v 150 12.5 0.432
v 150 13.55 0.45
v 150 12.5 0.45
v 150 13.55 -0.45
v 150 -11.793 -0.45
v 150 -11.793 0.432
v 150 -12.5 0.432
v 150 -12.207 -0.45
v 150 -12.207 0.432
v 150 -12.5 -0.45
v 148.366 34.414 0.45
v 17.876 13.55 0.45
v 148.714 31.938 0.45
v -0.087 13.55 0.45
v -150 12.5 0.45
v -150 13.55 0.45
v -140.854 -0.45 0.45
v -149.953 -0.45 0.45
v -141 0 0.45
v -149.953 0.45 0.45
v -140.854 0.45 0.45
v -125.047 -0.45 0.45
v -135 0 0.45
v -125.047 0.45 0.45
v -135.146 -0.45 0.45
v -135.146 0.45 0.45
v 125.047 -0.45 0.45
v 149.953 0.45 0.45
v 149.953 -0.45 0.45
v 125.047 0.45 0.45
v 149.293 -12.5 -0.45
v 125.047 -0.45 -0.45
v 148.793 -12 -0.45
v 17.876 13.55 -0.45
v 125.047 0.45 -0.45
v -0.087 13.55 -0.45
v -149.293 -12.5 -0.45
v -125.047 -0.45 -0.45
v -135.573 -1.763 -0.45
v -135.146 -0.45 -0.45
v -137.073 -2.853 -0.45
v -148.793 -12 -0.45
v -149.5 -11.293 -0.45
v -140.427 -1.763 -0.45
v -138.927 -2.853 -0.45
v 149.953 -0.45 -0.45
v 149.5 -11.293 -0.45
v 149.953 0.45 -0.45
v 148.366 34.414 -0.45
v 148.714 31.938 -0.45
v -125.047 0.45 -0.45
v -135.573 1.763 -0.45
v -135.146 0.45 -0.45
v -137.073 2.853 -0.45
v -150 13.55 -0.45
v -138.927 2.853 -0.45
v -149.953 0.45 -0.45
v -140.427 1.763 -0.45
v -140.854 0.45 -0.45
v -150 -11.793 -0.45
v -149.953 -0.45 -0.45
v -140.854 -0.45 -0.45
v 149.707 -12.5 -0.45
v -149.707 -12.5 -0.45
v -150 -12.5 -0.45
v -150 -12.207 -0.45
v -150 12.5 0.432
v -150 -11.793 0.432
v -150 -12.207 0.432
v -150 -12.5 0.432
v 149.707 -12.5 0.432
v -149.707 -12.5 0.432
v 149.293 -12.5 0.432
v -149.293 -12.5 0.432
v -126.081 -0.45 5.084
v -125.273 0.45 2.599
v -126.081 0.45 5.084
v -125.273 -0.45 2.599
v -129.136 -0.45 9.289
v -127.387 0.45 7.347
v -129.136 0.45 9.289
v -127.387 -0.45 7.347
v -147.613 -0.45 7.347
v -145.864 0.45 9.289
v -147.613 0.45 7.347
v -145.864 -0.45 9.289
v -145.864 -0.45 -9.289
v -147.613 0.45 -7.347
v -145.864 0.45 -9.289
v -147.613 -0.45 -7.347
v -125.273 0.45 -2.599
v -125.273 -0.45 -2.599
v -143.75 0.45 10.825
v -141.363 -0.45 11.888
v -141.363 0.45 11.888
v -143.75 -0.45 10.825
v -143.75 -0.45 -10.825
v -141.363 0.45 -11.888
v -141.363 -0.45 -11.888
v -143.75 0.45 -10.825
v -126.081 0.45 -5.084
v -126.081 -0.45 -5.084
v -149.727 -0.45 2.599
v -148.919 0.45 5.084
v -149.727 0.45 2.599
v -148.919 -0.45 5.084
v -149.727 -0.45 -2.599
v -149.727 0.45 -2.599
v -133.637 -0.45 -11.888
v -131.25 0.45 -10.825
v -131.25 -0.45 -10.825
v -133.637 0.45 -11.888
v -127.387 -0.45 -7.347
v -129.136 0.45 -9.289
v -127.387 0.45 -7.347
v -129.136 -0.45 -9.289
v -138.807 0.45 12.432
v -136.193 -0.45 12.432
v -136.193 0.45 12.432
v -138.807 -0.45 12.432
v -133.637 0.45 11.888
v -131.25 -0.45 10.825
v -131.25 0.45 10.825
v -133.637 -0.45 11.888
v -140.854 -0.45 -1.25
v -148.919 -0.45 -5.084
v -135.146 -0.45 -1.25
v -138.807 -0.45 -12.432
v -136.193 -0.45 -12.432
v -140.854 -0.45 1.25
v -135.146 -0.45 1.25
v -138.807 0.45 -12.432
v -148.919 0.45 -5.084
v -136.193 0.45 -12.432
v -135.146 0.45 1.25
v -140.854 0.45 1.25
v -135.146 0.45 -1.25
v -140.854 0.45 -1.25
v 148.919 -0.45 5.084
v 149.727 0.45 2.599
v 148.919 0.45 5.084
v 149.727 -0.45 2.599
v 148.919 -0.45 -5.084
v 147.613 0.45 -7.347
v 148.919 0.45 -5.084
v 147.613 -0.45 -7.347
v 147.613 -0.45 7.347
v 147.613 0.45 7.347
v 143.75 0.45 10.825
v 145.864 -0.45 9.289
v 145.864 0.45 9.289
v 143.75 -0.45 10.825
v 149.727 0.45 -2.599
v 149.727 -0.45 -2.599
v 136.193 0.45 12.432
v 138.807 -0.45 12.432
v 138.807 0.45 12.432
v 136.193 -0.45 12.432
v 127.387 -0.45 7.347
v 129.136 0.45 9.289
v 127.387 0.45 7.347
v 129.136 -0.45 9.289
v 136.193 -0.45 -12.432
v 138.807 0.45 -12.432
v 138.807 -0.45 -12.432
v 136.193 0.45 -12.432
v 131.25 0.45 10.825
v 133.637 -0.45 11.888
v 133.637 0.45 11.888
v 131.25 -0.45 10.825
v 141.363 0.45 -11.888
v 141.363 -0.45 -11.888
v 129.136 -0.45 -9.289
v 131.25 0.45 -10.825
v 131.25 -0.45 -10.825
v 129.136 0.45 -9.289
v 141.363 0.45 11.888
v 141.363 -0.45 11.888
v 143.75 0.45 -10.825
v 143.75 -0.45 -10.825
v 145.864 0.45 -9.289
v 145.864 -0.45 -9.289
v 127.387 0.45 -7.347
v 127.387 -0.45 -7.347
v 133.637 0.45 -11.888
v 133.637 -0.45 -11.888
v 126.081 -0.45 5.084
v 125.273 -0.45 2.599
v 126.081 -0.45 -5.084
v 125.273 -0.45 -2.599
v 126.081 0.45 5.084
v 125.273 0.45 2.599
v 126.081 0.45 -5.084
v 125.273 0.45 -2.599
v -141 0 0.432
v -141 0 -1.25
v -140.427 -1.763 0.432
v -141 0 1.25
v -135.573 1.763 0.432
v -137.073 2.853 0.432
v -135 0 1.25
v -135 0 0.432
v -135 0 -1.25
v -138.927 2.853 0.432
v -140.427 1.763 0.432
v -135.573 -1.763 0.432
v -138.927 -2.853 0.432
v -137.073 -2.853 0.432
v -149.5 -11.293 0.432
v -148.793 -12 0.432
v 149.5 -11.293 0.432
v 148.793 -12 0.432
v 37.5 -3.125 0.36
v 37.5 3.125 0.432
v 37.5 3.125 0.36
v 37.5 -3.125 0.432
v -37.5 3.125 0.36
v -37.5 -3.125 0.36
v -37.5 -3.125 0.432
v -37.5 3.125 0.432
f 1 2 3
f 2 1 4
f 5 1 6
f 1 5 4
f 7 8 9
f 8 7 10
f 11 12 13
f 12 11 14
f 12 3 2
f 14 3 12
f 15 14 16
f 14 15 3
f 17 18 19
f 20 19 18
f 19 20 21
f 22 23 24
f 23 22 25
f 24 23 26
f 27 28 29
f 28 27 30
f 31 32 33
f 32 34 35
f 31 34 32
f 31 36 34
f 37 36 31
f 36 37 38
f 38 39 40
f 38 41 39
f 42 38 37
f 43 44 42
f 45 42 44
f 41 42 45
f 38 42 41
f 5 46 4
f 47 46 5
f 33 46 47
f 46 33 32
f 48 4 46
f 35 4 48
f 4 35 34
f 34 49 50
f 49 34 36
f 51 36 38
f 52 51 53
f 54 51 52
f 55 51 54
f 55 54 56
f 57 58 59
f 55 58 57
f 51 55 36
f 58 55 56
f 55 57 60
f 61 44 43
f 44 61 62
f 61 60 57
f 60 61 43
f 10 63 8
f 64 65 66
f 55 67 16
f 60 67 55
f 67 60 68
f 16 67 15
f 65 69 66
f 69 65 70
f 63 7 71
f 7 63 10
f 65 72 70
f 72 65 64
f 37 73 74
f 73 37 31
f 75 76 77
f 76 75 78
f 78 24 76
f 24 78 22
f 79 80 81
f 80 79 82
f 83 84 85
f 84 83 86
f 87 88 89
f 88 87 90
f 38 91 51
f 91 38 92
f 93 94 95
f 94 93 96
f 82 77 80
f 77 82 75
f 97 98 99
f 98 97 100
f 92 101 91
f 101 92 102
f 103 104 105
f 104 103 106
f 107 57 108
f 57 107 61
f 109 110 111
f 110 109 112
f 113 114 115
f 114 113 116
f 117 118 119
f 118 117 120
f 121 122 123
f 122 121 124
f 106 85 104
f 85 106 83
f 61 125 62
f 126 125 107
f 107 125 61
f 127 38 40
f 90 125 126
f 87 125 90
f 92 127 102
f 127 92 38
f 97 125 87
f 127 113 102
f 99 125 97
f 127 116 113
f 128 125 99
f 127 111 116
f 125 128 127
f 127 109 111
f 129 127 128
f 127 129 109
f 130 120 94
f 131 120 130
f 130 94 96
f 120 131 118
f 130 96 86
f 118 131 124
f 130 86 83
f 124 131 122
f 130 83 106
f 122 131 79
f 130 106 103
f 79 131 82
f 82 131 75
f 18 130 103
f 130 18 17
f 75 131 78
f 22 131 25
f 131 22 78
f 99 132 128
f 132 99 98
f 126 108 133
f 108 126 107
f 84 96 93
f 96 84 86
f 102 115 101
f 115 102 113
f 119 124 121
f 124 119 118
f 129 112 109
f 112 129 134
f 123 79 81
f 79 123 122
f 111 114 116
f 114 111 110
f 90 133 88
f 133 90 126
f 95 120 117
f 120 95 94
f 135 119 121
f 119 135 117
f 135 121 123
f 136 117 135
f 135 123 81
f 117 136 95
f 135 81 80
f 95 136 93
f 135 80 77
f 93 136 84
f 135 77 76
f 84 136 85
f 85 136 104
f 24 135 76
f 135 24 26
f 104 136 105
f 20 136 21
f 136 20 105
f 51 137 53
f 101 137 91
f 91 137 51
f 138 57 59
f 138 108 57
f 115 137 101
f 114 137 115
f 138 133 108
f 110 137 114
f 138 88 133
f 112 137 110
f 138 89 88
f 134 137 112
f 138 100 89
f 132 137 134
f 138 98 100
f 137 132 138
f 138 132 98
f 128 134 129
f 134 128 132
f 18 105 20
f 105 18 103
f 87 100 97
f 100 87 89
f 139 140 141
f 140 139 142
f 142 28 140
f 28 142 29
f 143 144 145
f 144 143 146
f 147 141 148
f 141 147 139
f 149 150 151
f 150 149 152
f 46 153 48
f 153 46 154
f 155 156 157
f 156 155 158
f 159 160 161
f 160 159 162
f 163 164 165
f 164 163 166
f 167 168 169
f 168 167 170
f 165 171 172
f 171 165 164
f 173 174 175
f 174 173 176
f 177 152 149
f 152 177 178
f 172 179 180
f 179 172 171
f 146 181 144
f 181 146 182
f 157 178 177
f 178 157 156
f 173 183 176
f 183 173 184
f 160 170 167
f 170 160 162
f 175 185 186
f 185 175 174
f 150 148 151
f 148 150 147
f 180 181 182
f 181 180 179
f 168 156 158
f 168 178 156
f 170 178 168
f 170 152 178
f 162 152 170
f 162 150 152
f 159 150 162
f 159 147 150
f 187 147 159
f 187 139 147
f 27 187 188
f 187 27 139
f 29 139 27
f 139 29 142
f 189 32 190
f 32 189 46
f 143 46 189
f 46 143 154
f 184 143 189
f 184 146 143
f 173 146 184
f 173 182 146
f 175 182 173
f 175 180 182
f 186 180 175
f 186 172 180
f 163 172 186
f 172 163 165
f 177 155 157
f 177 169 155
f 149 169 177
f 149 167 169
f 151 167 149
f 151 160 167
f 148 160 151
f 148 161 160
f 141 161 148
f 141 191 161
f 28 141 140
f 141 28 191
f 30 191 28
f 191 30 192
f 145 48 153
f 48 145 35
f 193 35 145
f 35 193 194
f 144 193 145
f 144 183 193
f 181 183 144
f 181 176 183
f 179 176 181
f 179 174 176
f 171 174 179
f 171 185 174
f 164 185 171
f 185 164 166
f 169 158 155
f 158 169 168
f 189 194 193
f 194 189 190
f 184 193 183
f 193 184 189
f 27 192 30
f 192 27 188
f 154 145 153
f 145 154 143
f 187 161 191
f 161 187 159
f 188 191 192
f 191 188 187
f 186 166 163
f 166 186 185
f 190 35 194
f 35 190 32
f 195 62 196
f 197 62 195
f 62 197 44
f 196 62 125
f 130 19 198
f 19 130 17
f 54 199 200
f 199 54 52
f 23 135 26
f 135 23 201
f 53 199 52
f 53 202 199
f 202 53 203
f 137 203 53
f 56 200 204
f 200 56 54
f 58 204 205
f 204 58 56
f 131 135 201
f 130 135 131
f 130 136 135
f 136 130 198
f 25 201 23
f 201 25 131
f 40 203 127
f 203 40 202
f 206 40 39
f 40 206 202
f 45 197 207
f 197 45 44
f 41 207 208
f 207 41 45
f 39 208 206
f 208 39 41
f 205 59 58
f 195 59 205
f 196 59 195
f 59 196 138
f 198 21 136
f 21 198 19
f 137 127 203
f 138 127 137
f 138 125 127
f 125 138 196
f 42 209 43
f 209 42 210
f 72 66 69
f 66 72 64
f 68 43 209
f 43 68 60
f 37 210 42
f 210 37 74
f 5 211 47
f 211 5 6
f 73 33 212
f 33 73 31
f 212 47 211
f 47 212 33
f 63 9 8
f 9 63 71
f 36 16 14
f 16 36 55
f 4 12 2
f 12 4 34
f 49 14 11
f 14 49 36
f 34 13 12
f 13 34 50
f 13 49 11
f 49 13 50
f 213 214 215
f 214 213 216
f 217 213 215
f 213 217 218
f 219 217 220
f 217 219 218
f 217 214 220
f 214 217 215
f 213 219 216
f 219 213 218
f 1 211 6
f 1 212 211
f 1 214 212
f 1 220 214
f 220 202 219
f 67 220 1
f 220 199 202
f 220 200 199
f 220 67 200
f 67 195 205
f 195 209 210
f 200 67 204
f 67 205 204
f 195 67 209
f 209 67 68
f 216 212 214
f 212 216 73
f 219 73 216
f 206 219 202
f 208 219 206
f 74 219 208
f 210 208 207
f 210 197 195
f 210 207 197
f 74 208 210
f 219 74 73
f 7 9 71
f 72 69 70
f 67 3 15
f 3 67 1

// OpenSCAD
// Parameters
blade_L = 300; //[150:600:1]
blade_W = 25; //[12.5:50:0.5]
blade_T = 0.9; //[0.45:1.8:0.05]
tooth_pitch = 2.5; //[1.25:5:0.05]
tooth_H = 1.2; //[0.6:2.4:0.05]
tooth_tip_angle = 60; //[30:90:1]
tooth_root_R = 0.2; //[0.1:0.6:0.05]
mount_hole_d = 6; //[3:12:0.1]
mount_hole_edge_offset = 12; //[6:24:0.5]
end_round_R = 3; //[1.5:8:0.5]
bimetal_band_W = 3; //[1.5:8:0.5]
overlap = 0.8; //[0.2:2:0.1]
tooth_skew_deg = 8; //[0:20:1]
tooth_count = 80; //[20:200:1]
chamfer_C = 1; //[0.5:3:0.1]

// Base Shapes
module blade_body_sheet() {
  translate([0, 0, 0])
    cube([blade_L, blade_W, blade_T], center=true);
}

module end_profile_left_cap() {
  translate([-blade_L/2 + blade_W/2, 0, 0])
    rotate([90, 0, 0])
      cylinder(r=blade_W/2, h=blade_T, center=true);
}

module end_profile_right_cap() {
  translate([blade_L/2 - blade_W/2, 0, 0])
    rotate([90, 0, 0])
      cylinder(r=blade_W/2, h=blade_T, center=true);
}

module mounting_hole_or_slot() {
  translate([-blade_L/2 + mount_hole_edge_offset, 0, 0])
    cylinder(r=mount_hole_d/2, h=blade_T + 2*overlap, center=true);
}

module bi_metal_edge_band() {
  translate([0, blade_W/2 - bimetal_band_W/2, 0])
    cube([blade_L, bimetal_band_W, blade_T], center=true);
}

module tooth_base() {
  translate([0, blade_W/2 - overlap, 0])
    linear_extrude(height=blade_T, center=true)
      polygon(points=[[-tooth_pitch/2, 0], [tooth_pitch/2, 0], [0, tooth_H]]);
}

module tooth_row() {
  translate([0, blade_W/2 + tooth_H/2 - overlap, 0])
    cube([blade_L, tooth_pitch, blade_T], center=true);
}

module tooth_set_alternation() {
  translate([0, blade_W/2 + tooth_H/2 - overlap, 0])
    rotate([0, 0, tooth_skew_deg])
      cube([blade_L, tooth_pitch, blade_T], center=true);
}

module corner_chamfer_cut_tl() {
  translate([-blade_L/2 + chamfer_C/2, blade_W/2 - chamfer_C/2, 0])
    rotate([0, 0, 45])
      cube([chamfer_C, chamfer_C, blade_T + 2*overlap], center=true);
}

module corner_chamfer_cut_tr() {
  translate([blade_L/2 - chamfer_C/2, blade_W/2 - chamfer_C/2, 0])
    rotate([0, 0, 45])
      cube([chamfer_C, chamfer_C, blade_T + 2*overlap], center=true);
}

module corner_chamfer_cut_bl() {
  translate([-blade_L/2 + chamfer_C/2, -blade_W/2 + chamfer_C/2, 0])
    rotate([0, 0, 45])
      cube([chamfer_C, chamfer_C, blade_T + 2*overlap], center=true);
}

module corner_chamfer_cut_br() {
  translate([blade_L/2 - chamfer_C/2, -blade_W/2 + chamfer_C/2, 0])
    rotate([0, 0, 45])
      cube([chamfer_C, chamfer_C, blade_T + 2*overlap], center=true);
}

module engraved_text_markings() {
  translate([0, 0, blade_T/2 - blade_T/20])
    cube([blade_L/4, blade_W/4, blade_T/10], center=true);
}

module surface_texture_finish() {
  translate([0, 0, blade_T/2 - blade_T/100])
    cube([blade_L, blade_W, blade_T/50], center=true);
}

// Operations
module end_profile_union() {
  union() {
    blade_body_sheet();
    end_profile_left_cap();
    end_profile_right_cap();
  }
}

module blade_with_hole() {
  difference() {
    end_profile_union();
    mounting_hole_or_slot();
  }
}

module blade_with_chamfers() {
  difference() {
    blade_with_hole();
    corner_chamfer_cut_tl();
    corner_chamfer_cut_tr();
    corner_chamfer_cut_bl();
    corner_chamfer_cut_br();
  }
}

module blade_with_bimetal_band() {
  union() {
    blade_with_chamfers();
    bi_metal_edge_band();
  }
}

module blade_with_teeth() {
  union() {
    blade_with_bimetal_band();
    tooth_row();
    tooth_set_alternation();
    tooth_base();
  }
}

module final_model() {
  difference() {
    blade_with_teeth();
    engraved_text_markings();
    surface_texture_finish();
  }
}

// Final Output
final_model();
